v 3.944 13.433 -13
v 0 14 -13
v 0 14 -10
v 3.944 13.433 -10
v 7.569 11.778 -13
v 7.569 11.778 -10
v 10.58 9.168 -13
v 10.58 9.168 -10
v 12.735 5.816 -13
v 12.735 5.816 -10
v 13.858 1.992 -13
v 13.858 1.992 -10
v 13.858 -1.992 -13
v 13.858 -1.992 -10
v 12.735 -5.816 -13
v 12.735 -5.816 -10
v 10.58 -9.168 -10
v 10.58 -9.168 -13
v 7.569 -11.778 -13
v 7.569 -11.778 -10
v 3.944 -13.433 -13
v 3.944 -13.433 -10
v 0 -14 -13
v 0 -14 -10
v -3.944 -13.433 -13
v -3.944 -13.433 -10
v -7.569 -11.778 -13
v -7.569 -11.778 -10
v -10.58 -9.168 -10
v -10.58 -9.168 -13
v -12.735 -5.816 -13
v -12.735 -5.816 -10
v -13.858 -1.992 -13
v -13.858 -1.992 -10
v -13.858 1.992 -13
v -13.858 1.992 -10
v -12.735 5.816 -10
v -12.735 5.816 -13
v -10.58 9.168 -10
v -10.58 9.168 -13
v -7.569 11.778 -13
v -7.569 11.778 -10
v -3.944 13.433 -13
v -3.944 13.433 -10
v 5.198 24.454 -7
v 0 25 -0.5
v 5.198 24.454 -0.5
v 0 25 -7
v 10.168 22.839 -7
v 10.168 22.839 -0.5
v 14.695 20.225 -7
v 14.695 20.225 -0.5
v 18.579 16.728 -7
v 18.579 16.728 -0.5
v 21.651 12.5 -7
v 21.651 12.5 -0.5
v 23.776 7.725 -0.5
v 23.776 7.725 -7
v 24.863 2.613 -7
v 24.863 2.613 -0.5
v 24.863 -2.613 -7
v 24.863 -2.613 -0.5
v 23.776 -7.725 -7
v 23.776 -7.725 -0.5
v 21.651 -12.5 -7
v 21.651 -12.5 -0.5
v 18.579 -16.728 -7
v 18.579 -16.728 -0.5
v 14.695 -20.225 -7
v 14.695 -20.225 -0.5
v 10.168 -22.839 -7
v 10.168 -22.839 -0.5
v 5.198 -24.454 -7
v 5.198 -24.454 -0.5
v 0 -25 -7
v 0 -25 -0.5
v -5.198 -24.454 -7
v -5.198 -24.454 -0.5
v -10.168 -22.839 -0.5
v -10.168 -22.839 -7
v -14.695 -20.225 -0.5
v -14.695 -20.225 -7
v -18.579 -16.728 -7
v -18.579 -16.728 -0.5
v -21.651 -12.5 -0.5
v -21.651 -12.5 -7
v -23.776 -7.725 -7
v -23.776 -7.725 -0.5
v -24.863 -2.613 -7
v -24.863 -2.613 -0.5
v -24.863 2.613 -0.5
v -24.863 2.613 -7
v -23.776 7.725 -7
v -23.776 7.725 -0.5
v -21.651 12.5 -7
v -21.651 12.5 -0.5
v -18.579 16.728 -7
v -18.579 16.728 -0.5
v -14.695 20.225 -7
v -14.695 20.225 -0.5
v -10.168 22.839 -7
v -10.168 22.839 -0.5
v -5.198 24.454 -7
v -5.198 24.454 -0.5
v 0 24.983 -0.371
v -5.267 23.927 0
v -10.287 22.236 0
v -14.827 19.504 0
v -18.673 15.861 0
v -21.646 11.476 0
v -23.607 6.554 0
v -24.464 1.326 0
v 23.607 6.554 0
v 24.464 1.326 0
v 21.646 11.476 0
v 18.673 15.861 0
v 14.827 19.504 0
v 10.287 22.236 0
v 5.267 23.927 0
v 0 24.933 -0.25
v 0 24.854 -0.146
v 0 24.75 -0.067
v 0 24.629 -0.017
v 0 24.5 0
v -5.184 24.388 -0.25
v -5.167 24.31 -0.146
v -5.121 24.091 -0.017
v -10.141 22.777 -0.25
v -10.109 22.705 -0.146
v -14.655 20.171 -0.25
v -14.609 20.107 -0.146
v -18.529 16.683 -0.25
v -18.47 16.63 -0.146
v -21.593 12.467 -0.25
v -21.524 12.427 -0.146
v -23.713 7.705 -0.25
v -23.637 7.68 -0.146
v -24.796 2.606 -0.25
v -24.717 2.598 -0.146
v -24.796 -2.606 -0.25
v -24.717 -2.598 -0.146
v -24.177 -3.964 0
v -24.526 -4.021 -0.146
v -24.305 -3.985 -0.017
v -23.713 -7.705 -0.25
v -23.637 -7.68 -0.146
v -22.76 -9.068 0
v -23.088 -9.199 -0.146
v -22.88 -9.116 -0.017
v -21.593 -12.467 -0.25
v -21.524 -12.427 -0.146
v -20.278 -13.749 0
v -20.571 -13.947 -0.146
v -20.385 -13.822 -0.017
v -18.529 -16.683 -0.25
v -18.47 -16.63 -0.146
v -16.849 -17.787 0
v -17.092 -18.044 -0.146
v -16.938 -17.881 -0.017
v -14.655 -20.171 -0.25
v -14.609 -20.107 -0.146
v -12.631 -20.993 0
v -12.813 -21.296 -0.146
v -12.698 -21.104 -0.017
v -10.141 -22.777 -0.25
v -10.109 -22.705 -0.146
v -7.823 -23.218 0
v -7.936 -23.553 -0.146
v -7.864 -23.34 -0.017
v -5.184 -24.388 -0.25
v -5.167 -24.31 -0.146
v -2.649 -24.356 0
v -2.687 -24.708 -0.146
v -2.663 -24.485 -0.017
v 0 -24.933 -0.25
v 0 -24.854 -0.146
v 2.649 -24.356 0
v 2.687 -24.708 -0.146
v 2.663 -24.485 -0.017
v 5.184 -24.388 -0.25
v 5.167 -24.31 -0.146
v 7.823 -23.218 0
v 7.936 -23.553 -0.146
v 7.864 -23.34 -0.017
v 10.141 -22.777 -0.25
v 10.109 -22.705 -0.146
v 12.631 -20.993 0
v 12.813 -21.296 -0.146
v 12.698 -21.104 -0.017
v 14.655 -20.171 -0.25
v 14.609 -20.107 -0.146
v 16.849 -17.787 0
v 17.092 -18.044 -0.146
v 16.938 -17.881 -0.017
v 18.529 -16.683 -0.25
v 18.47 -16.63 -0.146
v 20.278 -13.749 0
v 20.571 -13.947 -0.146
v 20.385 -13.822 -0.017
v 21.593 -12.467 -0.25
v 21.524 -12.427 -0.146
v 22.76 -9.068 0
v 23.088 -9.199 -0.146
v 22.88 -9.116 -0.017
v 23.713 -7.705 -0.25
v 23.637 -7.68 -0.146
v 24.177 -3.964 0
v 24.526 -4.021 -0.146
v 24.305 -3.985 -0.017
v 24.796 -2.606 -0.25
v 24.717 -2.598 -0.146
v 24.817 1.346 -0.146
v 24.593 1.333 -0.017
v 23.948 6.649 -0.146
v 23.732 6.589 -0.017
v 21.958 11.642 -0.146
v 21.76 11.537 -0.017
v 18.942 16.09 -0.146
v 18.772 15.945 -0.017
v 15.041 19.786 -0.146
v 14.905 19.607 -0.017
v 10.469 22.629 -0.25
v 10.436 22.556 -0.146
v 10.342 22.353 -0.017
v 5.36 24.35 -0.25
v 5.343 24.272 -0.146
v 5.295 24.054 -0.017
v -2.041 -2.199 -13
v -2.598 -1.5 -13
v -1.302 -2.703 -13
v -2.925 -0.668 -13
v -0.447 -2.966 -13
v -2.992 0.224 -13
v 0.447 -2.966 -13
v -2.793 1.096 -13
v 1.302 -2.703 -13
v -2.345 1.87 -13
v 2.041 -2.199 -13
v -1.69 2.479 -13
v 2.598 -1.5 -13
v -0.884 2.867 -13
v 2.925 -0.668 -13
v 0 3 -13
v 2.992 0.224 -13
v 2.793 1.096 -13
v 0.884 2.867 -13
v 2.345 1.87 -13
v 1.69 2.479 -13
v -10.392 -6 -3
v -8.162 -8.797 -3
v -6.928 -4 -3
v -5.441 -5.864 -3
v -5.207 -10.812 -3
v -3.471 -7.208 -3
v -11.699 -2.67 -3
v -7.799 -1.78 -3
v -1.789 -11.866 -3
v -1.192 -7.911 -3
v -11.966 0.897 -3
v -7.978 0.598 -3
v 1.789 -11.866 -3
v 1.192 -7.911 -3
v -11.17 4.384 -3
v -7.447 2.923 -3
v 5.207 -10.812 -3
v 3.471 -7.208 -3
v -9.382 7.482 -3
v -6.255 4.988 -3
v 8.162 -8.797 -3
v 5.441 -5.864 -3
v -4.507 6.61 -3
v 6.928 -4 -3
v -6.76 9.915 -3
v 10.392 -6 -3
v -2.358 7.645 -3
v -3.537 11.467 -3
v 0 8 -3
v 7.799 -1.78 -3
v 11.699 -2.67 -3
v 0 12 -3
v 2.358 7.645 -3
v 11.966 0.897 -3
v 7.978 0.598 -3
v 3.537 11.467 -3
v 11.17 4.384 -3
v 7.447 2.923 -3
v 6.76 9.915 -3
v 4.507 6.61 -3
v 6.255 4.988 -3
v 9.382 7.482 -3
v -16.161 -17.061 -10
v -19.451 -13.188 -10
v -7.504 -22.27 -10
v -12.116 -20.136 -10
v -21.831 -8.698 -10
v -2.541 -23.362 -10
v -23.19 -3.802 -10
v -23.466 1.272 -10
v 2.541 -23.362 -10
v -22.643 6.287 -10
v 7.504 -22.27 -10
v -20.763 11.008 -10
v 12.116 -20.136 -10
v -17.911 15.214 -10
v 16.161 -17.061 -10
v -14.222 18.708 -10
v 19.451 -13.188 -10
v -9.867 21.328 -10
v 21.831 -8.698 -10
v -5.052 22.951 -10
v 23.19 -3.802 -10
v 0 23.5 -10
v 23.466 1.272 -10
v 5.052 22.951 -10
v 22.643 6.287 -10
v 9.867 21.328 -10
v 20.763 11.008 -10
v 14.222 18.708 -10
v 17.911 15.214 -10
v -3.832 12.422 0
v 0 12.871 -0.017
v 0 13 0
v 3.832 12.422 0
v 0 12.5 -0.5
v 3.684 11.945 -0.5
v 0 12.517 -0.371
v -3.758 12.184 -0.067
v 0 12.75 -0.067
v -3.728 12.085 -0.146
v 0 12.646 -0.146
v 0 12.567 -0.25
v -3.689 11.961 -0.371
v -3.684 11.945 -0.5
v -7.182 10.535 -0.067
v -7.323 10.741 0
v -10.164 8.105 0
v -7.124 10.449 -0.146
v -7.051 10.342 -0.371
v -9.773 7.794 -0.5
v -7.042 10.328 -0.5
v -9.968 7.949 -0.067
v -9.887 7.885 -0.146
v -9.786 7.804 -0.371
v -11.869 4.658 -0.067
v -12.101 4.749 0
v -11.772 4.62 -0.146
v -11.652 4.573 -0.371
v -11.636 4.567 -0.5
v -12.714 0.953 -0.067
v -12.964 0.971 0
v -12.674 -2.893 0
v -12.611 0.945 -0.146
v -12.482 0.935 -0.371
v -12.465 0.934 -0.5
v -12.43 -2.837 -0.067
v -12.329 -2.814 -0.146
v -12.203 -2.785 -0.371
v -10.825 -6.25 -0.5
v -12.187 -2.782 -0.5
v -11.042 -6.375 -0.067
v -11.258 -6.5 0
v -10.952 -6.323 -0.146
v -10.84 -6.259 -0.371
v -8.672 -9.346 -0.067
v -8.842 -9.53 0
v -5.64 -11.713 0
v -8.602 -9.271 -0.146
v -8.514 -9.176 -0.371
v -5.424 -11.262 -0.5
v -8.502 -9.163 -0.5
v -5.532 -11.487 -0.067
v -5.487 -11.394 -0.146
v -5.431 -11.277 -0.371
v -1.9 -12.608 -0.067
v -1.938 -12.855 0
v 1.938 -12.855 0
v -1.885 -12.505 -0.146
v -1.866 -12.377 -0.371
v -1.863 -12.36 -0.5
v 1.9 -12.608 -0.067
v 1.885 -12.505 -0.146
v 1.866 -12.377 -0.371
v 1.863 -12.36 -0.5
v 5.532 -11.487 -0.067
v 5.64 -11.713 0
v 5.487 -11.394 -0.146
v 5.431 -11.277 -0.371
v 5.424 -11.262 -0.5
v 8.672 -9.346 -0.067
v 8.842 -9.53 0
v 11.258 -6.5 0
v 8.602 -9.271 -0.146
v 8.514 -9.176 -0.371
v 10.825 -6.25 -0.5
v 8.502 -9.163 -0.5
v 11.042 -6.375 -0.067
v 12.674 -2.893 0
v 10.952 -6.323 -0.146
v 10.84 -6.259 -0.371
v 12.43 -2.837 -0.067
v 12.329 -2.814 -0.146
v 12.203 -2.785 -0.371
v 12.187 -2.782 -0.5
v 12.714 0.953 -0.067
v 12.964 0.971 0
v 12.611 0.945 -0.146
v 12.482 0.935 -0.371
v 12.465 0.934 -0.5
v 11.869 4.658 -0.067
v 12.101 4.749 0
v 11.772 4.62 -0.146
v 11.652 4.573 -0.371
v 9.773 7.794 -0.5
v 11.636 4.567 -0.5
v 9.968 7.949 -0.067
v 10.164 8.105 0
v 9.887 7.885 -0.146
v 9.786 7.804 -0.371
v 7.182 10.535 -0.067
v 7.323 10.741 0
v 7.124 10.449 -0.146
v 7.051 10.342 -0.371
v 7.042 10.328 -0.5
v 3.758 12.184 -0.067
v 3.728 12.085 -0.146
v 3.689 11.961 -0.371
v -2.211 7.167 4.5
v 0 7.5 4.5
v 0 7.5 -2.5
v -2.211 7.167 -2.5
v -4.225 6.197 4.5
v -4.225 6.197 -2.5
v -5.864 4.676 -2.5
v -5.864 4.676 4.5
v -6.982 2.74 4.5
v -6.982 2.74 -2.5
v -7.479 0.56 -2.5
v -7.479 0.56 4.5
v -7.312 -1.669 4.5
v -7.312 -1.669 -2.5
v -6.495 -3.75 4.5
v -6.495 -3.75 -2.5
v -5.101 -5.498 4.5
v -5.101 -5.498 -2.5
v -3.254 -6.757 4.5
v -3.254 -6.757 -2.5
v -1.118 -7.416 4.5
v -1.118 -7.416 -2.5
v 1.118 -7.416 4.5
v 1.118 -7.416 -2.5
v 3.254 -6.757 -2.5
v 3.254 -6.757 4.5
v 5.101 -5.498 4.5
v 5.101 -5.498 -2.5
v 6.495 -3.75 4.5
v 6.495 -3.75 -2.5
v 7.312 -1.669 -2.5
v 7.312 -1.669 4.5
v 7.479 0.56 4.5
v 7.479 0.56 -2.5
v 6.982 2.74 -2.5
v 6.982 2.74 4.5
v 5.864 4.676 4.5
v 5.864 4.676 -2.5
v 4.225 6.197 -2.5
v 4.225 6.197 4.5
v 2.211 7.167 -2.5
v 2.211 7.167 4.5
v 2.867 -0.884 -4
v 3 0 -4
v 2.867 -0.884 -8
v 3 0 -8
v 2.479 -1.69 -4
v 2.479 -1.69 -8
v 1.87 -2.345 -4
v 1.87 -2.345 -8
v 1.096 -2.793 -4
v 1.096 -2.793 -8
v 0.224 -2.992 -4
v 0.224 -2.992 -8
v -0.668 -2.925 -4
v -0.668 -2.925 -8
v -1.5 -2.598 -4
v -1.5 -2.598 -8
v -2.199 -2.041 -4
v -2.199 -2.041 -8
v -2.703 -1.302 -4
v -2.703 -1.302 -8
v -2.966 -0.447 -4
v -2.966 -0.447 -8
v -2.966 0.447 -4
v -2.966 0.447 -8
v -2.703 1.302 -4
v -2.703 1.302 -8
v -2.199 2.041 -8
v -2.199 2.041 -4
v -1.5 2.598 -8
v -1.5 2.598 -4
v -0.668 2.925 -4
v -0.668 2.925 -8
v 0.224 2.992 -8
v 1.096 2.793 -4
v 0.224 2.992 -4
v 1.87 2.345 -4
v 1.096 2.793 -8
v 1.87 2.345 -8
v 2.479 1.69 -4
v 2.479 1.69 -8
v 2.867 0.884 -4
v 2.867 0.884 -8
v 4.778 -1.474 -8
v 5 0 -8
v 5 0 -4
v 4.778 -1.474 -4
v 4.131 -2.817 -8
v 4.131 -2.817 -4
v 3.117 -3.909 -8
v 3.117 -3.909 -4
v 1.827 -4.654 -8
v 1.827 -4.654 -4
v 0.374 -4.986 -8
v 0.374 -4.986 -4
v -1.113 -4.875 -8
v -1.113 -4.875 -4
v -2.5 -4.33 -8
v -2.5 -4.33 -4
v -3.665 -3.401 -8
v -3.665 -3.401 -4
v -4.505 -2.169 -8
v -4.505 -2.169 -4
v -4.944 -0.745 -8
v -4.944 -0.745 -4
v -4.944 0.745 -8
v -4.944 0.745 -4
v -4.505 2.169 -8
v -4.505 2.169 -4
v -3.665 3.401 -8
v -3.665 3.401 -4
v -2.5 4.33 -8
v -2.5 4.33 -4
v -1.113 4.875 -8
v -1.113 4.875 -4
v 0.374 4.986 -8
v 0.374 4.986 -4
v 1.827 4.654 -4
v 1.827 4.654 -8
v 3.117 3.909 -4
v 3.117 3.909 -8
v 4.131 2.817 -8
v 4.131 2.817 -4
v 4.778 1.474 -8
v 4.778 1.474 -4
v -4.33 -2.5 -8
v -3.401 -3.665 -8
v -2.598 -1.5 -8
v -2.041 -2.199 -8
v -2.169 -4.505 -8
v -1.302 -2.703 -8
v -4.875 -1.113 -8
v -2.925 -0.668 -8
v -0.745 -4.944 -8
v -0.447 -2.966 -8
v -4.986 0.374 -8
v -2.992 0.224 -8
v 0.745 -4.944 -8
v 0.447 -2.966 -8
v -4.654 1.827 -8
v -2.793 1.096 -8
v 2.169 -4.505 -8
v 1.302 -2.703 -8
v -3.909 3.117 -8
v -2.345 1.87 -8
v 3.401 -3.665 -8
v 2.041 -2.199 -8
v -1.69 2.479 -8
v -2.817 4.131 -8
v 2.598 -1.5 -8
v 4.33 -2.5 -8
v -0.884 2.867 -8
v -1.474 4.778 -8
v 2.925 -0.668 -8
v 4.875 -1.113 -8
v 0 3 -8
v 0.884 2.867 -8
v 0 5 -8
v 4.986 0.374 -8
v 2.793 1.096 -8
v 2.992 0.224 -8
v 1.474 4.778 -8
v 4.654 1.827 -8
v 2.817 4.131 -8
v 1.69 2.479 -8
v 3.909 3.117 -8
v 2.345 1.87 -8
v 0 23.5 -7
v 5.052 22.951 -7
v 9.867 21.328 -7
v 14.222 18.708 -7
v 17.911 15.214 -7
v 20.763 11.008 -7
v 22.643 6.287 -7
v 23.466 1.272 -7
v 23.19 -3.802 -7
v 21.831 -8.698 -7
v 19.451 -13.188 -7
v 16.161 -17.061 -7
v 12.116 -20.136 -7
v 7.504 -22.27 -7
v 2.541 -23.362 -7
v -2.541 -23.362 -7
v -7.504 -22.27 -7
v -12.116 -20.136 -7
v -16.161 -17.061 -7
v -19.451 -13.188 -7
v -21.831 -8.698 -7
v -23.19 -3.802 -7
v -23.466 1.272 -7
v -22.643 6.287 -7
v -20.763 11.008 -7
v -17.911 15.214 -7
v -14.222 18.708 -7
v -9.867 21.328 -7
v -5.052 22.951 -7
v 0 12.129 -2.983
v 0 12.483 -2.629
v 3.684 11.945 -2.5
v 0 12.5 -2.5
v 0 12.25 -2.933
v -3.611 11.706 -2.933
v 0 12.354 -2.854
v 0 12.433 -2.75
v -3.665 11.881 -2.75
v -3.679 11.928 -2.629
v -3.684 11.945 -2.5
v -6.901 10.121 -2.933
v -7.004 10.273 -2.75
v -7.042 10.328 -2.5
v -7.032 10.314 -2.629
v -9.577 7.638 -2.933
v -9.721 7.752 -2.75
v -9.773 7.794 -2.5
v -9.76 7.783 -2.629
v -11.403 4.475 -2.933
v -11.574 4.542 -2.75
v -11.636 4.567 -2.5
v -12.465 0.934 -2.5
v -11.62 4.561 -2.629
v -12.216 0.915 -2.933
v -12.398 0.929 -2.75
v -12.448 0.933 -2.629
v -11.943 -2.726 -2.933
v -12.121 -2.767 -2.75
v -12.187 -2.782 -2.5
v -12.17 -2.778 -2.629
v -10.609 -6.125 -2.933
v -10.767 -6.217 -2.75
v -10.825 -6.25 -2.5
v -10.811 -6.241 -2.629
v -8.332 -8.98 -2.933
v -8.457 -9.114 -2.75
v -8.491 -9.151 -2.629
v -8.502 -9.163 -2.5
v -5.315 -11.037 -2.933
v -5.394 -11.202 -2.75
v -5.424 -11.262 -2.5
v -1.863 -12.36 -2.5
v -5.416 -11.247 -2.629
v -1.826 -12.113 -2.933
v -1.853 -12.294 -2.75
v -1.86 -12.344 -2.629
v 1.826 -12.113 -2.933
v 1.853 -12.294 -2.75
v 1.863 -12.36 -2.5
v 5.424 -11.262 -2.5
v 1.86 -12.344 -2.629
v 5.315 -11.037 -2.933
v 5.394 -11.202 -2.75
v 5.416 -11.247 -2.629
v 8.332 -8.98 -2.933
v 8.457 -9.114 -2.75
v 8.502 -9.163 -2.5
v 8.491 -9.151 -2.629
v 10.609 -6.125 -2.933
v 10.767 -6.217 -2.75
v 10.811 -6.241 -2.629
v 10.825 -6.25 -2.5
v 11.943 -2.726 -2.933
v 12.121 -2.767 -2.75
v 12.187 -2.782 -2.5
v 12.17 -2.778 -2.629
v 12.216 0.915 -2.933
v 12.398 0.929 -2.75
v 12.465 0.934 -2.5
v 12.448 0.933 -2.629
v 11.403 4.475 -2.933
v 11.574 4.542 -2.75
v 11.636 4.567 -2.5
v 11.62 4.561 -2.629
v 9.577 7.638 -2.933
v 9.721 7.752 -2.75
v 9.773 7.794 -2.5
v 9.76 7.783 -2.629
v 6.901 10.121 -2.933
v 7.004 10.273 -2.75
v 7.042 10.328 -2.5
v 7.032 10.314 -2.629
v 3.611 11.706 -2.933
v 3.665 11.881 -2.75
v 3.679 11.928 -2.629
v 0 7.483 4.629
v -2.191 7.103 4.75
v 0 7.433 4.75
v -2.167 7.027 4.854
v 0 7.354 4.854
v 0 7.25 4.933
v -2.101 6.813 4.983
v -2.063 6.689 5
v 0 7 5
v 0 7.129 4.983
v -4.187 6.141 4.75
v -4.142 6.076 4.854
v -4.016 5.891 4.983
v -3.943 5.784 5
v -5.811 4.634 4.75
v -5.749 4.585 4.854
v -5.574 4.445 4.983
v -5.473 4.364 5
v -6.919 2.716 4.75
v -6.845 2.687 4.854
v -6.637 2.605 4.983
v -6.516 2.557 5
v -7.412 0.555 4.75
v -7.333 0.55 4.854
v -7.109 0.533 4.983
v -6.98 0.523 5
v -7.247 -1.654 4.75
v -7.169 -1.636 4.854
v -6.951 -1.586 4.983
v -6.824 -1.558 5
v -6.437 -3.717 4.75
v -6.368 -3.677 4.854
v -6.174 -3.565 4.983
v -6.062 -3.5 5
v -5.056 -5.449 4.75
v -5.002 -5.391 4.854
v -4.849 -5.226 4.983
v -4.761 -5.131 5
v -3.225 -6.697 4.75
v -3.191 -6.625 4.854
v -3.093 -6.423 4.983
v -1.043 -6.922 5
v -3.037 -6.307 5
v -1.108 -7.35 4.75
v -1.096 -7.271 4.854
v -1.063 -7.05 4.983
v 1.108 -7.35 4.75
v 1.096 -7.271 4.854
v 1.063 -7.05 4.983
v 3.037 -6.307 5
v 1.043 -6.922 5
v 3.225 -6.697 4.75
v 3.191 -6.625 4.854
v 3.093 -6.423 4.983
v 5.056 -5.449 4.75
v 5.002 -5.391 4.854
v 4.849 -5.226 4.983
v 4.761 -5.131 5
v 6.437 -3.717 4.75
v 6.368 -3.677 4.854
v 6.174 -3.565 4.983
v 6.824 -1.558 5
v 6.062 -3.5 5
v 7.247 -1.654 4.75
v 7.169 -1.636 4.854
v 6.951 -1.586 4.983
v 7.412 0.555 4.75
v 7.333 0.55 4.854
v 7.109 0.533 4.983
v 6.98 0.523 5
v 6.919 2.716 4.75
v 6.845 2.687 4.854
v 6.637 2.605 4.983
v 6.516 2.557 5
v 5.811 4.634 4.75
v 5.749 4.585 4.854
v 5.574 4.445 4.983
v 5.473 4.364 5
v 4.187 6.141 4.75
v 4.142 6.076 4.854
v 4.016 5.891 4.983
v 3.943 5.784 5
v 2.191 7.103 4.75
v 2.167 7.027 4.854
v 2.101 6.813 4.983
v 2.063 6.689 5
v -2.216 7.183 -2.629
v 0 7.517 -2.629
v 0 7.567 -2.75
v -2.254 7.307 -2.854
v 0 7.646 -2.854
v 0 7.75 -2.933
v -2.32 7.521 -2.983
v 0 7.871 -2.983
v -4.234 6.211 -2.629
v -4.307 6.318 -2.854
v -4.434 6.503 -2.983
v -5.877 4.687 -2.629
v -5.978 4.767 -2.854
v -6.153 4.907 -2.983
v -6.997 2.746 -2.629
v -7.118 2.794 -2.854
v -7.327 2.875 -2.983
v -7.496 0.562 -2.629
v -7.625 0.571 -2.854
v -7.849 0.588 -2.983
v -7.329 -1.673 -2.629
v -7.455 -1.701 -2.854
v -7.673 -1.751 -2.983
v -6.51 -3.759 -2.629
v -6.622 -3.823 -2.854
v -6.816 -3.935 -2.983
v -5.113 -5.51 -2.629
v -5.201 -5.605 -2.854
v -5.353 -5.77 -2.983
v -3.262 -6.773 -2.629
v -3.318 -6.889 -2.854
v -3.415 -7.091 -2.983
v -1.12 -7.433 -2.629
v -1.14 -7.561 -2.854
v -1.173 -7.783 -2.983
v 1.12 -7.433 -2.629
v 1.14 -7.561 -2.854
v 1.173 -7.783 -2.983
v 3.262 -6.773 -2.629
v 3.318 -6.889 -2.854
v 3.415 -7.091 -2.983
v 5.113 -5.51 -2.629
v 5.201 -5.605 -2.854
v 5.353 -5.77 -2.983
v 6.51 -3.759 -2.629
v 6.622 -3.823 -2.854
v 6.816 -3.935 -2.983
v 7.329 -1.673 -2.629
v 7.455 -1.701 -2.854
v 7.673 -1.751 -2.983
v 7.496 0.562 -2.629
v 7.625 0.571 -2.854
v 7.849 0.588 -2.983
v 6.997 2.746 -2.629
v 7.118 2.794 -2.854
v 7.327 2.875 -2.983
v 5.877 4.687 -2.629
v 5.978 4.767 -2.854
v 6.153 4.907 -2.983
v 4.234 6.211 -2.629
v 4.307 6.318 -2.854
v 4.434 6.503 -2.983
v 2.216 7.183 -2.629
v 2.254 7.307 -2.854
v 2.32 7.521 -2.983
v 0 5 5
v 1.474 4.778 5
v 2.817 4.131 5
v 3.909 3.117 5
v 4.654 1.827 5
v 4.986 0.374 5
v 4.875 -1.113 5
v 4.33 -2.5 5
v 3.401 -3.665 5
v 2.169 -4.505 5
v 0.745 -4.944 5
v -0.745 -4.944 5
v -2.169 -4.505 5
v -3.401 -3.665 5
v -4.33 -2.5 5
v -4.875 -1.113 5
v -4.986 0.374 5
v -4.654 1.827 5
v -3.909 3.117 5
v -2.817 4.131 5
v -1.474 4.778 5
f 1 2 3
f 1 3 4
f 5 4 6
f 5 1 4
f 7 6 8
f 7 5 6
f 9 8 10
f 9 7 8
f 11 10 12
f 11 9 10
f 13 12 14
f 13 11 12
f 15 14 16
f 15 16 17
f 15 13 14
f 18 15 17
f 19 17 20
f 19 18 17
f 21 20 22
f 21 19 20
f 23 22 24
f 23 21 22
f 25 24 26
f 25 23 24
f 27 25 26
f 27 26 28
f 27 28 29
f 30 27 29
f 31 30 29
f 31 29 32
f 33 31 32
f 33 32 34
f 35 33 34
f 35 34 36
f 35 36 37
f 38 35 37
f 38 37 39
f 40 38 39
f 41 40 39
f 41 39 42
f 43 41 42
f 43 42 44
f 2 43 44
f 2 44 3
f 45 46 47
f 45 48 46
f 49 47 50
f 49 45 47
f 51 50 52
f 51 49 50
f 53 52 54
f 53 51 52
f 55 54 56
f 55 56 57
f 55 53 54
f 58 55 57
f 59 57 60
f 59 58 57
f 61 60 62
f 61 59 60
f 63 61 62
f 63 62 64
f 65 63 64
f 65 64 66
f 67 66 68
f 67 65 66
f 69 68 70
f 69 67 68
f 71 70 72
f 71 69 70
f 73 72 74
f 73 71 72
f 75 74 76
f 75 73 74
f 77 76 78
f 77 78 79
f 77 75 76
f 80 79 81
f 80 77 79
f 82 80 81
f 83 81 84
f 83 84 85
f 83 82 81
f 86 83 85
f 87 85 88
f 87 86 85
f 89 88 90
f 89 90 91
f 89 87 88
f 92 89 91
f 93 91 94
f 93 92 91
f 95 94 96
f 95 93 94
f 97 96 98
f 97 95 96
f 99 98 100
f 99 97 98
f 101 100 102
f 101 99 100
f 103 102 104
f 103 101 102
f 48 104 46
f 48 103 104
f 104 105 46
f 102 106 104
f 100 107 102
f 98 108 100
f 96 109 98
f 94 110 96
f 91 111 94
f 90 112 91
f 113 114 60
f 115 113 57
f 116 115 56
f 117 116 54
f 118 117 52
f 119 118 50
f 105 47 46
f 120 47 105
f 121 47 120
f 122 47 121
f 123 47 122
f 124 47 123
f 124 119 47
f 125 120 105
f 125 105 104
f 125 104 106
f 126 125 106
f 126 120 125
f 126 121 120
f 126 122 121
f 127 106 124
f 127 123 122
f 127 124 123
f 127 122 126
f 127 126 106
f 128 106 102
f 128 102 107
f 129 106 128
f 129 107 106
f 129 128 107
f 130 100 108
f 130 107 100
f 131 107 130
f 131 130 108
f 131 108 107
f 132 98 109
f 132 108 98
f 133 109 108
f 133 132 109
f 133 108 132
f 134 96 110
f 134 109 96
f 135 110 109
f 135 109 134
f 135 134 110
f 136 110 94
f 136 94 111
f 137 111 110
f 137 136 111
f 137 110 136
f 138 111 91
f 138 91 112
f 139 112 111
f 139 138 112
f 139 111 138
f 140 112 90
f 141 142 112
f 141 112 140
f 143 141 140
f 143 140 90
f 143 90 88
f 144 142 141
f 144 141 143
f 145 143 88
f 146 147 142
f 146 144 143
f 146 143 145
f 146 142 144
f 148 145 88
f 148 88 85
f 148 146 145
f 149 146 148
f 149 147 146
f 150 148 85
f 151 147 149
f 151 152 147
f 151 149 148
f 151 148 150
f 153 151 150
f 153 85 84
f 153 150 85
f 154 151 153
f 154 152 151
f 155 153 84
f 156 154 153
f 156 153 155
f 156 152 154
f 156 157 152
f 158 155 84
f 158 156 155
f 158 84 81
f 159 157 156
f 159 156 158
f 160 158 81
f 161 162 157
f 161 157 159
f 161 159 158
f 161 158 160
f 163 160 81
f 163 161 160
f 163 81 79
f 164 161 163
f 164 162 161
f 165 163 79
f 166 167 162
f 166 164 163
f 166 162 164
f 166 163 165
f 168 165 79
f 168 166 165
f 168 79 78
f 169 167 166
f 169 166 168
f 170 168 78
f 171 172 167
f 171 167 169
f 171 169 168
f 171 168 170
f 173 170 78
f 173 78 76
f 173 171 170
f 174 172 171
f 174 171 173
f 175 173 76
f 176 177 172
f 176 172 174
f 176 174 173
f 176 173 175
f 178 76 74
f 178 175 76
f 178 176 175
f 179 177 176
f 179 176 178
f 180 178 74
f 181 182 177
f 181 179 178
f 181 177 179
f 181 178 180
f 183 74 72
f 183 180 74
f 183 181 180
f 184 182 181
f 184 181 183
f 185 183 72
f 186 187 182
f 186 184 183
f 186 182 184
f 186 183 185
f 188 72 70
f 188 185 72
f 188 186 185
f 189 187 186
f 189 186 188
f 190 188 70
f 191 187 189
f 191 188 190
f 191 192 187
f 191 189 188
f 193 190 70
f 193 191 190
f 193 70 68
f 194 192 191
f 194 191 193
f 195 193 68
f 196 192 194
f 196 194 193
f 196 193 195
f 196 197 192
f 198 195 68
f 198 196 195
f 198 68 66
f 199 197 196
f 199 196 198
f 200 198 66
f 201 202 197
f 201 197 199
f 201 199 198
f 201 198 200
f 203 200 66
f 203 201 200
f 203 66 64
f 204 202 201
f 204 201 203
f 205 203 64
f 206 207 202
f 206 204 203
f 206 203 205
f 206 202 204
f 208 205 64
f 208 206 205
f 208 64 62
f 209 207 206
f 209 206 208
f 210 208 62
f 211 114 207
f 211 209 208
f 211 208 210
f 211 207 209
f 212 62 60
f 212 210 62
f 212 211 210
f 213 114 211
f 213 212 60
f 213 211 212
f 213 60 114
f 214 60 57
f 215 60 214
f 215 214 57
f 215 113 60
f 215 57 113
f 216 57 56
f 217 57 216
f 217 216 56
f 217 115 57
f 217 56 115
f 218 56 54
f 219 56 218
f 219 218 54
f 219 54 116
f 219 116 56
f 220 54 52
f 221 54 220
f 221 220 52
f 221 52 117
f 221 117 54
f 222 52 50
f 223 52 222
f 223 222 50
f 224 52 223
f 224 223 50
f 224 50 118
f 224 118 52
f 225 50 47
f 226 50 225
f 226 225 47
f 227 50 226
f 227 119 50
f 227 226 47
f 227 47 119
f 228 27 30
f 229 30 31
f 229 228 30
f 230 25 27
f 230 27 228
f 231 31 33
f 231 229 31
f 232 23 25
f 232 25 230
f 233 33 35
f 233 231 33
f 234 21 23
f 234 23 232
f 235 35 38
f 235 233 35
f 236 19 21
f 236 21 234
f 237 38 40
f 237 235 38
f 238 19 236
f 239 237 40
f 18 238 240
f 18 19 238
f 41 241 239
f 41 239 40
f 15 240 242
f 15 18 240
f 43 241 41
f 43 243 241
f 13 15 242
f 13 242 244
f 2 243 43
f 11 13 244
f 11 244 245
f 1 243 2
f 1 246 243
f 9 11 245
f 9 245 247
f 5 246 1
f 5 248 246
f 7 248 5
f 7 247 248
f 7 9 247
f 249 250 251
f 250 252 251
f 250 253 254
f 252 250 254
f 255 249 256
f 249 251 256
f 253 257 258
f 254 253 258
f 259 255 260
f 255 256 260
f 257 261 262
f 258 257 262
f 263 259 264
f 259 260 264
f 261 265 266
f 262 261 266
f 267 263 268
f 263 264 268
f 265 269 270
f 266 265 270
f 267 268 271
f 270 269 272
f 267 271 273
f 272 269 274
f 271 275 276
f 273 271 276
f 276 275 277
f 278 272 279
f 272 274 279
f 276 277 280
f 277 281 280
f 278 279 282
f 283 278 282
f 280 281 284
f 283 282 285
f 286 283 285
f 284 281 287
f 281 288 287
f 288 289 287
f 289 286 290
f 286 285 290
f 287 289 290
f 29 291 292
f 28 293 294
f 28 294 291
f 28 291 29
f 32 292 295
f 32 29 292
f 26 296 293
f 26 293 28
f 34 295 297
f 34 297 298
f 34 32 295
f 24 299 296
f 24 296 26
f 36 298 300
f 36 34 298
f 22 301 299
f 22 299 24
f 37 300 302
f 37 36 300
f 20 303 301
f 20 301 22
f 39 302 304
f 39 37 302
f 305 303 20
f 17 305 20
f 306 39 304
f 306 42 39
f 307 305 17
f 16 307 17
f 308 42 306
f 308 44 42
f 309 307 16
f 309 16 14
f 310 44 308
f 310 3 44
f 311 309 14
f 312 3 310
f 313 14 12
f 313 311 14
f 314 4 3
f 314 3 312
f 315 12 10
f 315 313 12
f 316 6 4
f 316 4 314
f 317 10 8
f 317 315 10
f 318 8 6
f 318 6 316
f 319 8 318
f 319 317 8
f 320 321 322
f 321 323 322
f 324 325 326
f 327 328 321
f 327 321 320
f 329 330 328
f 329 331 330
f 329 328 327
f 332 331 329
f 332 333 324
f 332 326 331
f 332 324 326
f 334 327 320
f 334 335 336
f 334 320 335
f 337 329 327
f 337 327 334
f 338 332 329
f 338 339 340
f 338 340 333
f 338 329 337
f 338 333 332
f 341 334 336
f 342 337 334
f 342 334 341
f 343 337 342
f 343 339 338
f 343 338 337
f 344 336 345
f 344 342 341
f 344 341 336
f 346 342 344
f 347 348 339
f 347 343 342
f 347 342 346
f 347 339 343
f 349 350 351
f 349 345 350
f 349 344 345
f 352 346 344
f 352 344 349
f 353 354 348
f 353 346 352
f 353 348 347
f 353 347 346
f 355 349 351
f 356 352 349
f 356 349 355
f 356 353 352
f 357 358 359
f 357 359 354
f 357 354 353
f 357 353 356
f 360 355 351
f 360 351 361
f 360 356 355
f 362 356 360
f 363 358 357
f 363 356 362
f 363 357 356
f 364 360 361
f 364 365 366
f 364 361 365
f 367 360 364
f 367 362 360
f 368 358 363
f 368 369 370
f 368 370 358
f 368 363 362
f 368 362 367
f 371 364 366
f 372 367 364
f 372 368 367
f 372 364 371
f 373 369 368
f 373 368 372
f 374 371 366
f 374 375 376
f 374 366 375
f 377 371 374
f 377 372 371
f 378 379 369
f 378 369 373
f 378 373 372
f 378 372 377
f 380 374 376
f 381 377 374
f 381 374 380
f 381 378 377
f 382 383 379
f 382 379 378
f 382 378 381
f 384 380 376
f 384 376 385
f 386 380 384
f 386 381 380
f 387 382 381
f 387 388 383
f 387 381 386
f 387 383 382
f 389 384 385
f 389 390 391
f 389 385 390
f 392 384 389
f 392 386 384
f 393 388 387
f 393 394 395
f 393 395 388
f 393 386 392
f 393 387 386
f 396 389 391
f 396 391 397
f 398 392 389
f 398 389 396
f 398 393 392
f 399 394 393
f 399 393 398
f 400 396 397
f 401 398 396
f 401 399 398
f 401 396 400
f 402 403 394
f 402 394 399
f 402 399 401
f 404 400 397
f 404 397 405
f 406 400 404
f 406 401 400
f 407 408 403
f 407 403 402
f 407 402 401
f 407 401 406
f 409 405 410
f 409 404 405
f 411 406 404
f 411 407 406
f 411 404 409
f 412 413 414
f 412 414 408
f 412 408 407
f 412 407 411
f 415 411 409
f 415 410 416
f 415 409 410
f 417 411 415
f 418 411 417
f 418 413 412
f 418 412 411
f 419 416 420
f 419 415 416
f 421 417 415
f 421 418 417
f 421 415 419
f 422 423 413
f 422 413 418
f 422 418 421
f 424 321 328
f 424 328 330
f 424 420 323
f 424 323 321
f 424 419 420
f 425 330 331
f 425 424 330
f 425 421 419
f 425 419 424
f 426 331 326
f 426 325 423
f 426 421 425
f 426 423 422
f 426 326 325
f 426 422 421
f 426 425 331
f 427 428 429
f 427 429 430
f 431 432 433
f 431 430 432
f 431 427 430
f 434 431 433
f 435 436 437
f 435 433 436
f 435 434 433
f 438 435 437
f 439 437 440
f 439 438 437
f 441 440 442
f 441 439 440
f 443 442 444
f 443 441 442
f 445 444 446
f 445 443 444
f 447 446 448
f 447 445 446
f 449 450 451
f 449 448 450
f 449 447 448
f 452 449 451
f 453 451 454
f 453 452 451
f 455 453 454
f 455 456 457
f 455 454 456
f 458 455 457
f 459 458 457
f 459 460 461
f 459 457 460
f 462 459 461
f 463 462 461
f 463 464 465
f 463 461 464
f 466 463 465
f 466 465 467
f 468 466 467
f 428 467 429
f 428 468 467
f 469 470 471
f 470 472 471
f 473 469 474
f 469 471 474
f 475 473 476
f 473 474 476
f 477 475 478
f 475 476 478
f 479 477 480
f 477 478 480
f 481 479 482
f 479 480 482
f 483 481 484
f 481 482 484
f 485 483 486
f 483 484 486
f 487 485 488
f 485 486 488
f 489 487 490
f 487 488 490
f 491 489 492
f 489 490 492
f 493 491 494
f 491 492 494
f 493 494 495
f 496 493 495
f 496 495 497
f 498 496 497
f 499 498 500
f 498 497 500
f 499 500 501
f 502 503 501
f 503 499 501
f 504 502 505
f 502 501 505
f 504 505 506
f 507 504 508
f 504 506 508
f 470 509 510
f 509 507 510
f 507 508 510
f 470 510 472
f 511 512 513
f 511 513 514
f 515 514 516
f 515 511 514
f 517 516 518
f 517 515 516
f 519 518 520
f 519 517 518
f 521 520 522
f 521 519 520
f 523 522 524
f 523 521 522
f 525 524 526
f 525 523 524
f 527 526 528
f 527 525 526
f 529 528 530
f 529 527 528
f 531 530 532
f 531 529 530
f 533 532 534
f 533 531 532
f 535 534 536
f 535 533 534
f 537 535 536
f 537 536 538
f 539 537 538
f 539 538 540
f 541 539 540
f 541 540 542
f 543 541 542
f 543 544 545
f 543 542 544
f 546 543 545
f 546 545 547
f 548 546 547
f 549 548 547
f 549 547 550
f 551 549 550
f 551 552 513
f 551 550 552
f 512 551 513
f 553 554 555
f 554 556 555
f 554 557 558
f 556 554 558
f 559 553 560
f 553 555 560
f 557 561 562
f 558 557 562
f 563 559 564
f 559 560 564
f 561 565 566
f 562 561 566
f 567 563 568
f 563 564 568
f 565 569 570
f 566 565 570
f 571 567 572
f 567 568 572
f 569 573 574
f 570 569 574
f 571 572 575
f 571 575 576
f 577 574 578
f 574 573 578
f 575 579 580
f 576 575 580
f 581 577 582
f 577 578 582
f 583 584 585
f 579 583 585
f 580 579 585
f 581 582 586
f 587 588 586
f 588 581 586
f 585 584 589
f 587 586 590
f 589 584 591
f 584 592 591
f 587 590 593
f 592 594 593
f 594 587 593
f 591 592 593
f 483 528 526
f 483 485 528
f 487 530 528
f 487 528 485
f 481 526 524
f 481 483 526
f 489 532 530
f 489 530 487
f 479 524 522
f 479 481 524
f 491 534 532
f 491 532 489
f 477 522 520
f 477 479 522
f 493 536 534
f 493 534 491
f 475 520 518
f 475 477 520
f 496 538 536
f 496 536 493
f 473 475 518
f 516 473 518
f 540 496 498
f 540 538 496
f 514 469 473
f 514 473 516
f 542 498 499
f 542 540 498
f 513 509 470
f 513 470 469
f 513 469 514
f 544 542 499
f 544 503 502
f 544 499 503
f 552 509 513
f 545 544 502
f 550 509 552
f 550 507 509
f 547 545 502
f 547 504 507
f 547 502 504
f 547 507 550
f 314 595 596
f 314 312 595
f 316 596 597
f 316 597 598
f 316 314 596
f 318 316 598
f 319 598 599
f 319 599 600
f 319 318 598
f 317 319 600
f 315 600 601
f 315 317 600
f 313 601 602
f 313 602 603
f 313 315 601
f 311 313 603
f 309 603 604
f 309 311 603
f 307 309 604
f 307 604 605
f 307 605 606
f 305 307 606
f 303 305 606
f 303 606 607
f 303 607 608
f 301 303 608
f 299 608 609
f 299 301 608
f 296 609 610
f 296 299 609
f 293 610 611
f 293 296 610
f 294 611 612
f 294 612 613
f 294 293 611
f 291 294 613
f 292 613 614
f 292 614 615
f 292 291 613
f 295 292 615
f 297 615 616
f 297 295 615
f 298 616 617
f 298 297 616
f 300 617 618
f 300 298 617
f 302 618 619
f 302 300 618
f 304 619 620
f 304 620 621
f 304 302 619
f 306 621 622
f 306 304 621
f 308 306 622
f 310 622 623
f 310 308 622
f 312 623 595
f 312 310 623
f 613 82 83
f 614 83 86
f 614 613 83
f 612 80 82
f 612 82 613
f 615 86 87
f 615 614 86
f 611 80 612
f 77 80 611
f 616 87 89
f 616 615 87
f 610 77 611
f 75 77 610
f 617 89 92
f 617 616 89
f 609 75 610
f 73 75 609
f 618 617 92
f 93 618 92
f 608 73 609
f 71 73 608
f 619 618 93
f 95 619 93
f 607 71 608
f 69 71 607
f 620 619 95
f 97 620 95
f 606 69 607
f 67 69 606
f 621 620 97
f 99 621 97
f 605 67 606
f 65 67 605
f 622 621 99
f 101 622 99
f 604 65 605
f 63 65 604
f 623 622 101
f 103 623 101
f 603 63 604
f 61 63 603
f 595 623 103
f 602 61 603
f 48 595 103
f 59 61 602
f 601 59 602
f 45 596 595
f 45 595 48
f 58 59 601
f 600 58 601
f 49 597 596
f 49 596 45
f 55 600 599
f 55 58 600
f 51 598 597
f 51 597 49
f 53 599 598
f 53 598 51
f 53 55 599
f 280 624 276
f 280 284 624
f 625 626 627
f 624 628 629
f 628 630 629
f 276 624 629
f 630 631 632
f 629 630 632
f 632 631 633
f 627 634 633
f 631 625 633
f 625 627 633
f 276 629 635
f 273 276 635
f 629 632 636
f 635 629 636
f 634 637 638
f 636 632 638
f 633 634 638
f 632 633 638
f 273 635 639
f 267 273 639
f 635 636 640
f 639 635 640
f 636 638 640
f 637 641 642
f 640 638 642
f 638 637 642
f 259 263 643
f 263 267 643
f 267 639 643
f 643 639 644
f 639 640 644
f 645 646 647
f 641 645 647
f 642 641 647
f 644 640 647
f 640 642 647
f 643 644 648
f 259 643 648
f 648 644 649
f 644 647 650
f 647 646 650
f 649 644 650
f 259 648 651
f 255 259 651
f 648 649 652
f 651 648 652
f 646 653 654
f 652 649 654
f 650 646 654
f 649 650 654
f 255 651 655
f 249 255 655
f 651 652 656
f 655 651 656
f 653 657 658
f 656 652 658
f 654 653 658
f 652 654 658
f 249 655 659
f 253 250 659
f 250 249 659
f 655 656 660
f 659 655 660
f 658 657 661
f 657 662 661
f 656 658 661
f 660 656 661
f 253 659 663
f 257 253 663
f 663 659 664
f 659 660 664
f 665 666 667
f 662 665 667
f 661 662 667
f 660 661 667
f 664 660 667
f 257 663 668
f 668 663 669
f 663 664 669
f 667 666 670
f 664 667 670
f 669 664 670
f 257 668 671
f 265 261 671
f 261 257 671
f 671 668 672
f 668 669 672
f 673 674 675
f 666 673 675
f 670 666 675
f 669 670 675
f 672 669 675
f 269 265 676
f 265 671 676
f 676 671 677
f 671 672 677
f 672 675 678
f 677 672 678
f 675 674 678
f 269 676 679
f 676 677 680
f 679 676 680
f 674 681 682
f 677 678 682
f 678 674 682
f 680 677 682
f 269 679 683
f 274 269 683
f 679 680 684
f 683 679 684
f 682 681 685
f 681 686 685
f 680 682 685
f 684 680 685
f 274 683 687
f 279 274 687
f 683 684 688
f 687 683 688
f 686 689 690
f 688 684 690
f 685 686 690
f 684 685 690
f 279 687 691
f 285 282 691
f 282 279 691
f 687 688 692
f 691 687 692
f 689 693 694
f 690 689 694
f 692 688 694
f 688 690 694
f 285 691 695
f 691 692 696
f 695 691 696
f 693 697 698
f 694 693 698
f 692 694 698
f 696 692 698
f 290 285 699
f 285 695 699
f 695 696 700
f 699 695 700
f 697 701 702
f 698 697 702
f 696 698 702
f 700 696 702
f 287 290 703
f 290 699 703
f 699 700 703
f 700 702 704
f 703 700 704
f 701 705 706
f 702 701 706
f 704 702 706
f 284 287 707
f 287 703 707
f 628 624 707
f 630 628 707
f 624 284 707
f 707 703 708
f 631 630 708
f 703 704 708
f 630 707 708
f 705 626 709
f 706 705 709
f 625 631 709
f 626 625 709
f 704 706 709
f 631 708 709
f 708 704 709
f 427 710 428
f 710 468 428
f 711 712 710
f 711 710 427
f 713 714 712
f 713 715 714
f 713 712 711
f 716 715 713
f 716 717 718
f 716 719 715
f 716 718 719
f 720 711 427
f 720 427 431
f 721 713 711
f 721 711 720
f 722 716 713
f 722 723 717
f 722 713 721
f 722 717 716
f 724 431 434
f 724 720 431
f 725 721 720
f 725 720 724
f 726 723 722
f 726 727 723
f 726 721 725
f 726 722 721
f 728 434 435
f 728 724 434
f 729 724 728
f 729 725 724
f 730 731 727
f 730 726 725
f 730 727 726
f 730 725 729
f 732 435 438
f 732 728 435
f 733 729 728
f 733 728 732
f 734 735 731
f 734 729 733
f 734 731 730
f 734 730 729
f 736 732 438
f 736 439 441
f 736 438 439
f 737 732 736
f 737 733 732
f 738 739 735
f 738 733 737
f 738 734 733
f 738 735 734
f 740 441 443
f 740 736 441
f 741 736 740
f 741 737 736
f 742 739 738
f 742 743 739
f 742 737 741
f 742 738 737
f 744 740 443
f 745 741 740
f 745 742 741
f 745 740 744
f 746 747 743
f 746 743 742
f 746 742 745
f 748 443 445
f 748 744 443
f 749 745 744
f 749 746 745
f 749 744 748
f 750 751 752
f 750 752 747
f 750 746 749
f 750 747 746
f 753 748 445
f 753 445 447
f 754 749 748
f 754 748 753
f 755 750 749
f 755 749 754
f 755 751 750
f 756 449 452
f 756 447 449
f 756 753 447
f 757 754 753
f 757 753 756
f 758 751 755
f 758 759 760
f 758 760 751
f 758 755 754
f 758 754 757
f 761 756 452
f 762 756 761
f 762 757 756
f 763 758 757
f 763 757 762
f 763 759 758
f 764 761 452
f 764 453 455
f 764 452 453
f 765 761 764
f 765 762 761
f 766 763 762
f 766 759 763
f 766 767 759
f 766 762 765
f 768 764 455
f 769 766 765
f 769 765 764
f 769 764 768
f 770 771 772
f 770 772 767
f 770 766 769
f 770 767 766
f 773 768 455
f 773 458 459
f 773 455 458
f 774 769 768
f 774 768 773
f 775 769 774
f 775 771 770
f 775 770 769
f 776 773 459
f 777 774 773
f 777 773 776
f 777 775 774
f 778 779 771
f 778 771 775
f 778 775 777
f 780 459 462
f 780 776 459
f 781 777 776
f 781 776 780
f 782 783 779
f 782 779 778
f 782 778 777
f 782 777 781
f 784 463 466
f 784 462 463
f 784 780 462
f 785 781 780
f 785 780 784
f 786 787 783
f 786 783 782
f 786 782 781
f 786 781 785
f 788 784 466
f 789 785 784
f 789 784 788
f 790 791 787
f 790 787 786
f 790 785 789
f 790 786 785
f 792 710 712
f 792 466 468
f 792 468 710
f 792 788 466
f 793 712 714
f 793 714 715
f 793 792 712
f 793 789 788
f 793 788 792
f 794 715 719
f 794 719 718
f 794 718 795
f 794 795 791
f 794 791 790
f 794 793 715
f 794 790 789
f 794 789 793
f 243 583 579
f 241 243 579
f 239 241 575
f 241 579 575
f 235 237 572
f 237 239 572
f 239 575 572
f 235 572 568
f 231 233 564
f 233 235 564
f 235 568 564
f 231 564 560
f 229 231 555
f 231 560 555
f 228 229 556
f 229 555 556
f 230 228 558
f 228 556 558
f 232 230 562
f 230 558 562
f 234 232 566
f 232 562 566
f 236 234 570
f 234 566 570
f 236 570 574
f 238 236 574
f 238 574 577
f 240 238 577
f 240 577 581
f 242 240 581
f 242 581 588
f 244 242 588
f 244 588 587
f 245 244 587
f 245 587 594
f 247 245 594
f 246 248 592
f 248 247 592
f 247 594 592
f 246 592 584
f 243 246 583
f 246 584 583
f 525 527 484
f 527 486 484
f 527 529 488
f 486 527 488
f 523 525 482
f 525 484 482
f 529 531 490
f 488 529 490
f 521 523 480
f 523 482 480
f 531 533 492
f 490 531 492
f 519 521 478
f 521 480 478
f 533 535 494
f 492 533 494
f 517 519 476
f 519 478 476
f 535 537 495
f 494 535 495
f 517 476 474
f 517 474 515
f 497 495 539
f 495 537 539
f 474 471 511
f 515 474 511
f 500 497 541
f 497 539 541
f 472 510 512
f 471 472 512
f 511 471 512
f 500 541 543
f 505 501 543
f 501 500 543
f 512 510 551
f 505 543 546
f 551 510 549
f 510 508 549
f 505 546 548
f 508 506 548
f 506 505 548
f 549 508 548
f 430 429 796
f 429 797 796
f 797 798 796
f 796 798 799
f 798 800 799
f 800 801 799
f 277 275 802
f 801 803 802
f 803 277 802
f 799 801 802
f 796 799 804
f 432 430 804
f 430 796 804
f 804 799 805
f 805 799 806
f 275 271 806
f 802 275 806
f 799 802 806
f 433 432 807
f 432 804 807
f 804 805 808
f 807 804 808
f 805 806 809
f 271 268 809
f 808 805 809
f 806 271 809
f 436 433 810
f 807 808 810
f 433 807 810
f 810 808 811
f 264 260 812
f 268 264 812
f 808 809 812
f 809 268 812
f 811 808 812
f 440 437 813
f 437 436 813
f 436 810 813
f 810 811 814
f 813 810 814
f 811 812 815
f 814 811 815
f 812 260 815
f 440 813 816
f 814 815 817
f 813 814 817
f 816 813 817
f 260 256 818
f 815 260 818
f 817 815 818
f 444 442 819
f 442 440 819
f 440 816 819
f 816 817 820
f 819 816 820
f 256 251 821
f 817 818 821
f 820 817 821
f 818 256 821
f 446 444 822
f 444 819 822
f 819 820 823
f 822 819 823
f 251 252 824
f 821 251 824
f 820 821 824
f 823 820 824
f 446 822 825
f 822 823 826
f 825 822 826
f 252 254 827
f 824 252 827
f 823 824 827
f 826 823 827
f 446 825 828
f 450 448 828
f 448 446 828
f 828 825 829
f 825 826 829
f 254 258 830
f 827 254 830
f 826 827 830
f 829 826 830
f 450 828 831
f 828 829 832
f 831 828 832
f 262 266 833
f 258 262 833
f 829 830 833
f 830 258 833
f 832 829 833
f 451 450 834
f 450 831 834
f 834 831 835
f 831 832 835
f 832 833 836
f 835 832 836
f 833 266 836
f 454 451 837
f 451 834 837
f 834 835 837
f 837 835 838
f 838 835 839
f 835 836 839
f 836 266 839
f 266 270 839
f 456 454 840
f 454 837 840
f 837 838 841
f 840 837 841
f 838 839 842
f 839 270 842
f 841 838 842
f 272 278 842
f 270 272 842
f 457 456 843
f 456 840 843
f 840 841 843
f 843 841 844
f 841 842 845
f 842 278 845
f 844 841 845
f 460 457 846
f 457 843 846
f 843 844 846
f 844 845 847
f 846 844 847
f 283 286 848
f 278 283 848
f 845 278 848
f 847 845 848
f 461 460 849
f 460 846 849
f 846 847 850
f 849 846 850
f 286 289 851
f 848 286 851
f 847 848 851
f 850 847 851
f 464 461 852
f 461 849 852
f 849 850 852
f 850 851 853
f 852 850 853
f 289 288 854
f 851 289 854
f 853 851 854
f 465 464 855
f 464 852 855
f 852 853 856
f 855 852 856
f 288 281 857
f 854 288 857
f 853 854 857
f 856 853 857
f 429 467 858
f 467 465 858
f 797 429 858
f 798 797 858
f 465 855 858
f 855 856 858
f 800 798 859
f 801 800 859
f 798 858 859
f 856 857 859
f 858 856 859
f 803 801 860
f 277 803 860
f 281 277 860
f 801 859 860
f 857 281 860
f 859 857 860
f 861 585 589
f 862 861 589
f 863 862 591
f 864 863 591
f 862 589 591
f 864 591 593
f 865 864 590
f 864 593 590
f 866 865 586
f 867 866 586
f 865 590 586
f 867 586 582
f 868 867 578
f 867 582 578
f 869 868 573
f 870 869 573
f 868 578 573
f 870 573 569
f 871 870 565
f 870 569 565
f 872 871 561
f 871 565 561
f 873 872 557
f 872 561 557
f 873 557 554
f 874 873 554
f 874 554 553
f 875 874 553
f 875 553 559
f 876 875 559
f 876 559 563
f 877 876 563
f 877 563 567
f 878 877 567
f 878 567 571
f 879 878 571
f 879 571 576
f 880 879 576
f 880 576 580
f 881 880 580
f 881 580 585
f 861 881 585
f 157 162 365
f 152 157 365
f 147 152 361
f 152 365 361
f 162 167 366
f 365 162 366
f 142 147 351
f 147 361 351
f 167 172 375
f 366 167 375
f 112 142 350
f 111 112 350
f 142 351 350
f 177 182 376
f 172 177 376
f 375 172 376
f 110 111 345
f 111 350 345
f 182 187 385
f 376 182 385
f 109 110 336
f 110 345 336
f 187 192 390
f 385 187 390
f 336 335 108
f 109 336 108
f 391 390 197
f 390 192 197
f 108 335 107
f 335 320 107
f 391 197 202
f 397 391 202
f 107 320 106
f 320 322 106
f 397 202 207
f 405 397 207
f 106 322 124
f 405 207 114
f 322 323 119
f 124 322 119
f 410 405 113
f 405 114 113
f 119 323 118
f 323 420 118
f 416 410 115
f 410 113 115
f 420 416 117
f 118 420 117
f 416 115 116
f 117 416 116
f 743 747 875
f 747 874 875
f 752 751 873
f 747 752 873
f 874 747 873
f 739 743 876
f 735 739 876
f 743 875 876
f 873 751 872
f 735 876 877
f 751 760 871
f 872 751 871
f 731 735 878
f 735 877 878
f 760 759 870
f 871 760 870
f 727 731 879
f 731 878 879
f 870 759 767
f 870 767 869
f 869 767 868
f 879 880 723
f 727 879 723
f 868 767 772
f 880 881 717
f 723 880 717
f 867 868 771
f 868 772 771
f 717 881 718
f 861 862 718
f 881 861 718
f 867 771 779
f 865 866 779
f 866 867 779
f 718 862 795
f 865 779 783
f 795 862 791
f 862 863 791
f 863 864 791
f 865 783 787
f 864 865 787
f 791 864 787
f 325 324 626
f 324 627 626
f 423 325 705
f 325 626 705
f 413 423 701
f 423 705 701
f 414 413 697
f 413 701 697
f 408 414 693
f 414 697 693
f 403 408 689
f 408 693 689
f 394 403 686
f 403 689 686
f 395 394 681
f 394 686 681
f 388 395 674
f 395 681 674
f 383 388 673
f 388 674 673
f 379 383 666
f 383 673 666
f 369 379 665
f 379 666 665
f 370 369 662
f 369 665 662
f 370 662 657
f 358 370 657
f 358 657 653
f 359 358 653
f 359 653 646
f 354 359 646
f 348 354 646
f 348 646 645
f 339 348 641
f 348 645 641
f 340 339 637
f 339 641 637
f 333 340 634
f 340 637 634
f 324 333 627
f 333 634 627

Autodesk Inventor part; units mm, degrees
ref_plane "YZ Plane" through (0, 0, 0) normal (1, 0, 0) x (0, 1, 0)
ref_plane "XZ Plane" through (0, 0, 0) normal (0, 1, 0) x (-1, 0, 0)
ref_plane "XY Plane" through (0, 0, 0) normal (0, 0, 1) x (1, 0, 0)
sketch "Skizze1" plane through (0, 0, 0) normal (1, 0, 0) x (0, 1, 0)
  line L0 (25, -0.5) -> (25, -7)
  line L1 (25, -7) -> (23.5, -7)
  line L2 (23.5, -7) -> (23.5, -10)
  line L3 (23.5, -10) -> (14, -10)
  line L4 (14, -10) -> (14, -13)
  line L5 (14, -13) -> (3, -13)
  line L6 (24.5, 0) -> (13, 0)
  line L7 (12, -3) -> (8, -3)
  line L8 (7.5, -2.5) -> (7.5, 4.5)
  line L9 (7, 5) -> (5, 5)
  line L10 (5, 5) -> (5, -8)
  line L11 (5, -8) -> (3, -8)
  line L12 (3, -13) -> (3, -8)
  arc A0 (12, -3) -> (12.5, -2.5) centre (12, -2.5) ccw
  line L13 (12.5, -0.5) -> (12.5, -2.5)
  arc A1 (13, 0) -> (12.5, -0.5) centre (13, -0.5) ccw
  arc A2 (7.5, -2.5) -> (8, -3) centre (8, -2.5) ccw
  arc A3 (7.5, 4.5) -> (7, 5) centre (7, 4.5) ccw
  arc A4 (25, -0.5) -> (24.5, 0) centre (24.5, -0.5) ccw
  line L14 (0, 0) -> (0, -2.0736) construction
  point P0 (25, 0)
  point P1 (12.5, 0)
  point P2 (7.5, -3)
  point P3 (7.5, 5)
  dimension "d5" = 7
  dimension "d6" = 3
  dimension "d7" = 3
  dimension "d11" = 8
  dimension "d12" = 13
  dimension "d13" = 5
  dimension "d14" = 11
  dimension "d15" = 12.5
  dimension "d16" = 9.5
  dimension "d18" = 0.5
  dimension "d19" = 0.5
revolve "Umdrehung1" add sketch "Skizze1" angle 360 about axis through (0, 0, 0) along (0, 0, -1)
sketch "Skizze2" plane through (0, 0, -8) normal (0, 0, 1) x (1, 0, 0)
  circle A0 centre (0, 0) radius 3 projected
  circle A1 centre (0, 0) radius 5 projected
extrude "Extrusion1" add sketch "Skizze2" along normal blind 4 separate body
properties part number "sf_Cylinder_Rear_Lid_1"
